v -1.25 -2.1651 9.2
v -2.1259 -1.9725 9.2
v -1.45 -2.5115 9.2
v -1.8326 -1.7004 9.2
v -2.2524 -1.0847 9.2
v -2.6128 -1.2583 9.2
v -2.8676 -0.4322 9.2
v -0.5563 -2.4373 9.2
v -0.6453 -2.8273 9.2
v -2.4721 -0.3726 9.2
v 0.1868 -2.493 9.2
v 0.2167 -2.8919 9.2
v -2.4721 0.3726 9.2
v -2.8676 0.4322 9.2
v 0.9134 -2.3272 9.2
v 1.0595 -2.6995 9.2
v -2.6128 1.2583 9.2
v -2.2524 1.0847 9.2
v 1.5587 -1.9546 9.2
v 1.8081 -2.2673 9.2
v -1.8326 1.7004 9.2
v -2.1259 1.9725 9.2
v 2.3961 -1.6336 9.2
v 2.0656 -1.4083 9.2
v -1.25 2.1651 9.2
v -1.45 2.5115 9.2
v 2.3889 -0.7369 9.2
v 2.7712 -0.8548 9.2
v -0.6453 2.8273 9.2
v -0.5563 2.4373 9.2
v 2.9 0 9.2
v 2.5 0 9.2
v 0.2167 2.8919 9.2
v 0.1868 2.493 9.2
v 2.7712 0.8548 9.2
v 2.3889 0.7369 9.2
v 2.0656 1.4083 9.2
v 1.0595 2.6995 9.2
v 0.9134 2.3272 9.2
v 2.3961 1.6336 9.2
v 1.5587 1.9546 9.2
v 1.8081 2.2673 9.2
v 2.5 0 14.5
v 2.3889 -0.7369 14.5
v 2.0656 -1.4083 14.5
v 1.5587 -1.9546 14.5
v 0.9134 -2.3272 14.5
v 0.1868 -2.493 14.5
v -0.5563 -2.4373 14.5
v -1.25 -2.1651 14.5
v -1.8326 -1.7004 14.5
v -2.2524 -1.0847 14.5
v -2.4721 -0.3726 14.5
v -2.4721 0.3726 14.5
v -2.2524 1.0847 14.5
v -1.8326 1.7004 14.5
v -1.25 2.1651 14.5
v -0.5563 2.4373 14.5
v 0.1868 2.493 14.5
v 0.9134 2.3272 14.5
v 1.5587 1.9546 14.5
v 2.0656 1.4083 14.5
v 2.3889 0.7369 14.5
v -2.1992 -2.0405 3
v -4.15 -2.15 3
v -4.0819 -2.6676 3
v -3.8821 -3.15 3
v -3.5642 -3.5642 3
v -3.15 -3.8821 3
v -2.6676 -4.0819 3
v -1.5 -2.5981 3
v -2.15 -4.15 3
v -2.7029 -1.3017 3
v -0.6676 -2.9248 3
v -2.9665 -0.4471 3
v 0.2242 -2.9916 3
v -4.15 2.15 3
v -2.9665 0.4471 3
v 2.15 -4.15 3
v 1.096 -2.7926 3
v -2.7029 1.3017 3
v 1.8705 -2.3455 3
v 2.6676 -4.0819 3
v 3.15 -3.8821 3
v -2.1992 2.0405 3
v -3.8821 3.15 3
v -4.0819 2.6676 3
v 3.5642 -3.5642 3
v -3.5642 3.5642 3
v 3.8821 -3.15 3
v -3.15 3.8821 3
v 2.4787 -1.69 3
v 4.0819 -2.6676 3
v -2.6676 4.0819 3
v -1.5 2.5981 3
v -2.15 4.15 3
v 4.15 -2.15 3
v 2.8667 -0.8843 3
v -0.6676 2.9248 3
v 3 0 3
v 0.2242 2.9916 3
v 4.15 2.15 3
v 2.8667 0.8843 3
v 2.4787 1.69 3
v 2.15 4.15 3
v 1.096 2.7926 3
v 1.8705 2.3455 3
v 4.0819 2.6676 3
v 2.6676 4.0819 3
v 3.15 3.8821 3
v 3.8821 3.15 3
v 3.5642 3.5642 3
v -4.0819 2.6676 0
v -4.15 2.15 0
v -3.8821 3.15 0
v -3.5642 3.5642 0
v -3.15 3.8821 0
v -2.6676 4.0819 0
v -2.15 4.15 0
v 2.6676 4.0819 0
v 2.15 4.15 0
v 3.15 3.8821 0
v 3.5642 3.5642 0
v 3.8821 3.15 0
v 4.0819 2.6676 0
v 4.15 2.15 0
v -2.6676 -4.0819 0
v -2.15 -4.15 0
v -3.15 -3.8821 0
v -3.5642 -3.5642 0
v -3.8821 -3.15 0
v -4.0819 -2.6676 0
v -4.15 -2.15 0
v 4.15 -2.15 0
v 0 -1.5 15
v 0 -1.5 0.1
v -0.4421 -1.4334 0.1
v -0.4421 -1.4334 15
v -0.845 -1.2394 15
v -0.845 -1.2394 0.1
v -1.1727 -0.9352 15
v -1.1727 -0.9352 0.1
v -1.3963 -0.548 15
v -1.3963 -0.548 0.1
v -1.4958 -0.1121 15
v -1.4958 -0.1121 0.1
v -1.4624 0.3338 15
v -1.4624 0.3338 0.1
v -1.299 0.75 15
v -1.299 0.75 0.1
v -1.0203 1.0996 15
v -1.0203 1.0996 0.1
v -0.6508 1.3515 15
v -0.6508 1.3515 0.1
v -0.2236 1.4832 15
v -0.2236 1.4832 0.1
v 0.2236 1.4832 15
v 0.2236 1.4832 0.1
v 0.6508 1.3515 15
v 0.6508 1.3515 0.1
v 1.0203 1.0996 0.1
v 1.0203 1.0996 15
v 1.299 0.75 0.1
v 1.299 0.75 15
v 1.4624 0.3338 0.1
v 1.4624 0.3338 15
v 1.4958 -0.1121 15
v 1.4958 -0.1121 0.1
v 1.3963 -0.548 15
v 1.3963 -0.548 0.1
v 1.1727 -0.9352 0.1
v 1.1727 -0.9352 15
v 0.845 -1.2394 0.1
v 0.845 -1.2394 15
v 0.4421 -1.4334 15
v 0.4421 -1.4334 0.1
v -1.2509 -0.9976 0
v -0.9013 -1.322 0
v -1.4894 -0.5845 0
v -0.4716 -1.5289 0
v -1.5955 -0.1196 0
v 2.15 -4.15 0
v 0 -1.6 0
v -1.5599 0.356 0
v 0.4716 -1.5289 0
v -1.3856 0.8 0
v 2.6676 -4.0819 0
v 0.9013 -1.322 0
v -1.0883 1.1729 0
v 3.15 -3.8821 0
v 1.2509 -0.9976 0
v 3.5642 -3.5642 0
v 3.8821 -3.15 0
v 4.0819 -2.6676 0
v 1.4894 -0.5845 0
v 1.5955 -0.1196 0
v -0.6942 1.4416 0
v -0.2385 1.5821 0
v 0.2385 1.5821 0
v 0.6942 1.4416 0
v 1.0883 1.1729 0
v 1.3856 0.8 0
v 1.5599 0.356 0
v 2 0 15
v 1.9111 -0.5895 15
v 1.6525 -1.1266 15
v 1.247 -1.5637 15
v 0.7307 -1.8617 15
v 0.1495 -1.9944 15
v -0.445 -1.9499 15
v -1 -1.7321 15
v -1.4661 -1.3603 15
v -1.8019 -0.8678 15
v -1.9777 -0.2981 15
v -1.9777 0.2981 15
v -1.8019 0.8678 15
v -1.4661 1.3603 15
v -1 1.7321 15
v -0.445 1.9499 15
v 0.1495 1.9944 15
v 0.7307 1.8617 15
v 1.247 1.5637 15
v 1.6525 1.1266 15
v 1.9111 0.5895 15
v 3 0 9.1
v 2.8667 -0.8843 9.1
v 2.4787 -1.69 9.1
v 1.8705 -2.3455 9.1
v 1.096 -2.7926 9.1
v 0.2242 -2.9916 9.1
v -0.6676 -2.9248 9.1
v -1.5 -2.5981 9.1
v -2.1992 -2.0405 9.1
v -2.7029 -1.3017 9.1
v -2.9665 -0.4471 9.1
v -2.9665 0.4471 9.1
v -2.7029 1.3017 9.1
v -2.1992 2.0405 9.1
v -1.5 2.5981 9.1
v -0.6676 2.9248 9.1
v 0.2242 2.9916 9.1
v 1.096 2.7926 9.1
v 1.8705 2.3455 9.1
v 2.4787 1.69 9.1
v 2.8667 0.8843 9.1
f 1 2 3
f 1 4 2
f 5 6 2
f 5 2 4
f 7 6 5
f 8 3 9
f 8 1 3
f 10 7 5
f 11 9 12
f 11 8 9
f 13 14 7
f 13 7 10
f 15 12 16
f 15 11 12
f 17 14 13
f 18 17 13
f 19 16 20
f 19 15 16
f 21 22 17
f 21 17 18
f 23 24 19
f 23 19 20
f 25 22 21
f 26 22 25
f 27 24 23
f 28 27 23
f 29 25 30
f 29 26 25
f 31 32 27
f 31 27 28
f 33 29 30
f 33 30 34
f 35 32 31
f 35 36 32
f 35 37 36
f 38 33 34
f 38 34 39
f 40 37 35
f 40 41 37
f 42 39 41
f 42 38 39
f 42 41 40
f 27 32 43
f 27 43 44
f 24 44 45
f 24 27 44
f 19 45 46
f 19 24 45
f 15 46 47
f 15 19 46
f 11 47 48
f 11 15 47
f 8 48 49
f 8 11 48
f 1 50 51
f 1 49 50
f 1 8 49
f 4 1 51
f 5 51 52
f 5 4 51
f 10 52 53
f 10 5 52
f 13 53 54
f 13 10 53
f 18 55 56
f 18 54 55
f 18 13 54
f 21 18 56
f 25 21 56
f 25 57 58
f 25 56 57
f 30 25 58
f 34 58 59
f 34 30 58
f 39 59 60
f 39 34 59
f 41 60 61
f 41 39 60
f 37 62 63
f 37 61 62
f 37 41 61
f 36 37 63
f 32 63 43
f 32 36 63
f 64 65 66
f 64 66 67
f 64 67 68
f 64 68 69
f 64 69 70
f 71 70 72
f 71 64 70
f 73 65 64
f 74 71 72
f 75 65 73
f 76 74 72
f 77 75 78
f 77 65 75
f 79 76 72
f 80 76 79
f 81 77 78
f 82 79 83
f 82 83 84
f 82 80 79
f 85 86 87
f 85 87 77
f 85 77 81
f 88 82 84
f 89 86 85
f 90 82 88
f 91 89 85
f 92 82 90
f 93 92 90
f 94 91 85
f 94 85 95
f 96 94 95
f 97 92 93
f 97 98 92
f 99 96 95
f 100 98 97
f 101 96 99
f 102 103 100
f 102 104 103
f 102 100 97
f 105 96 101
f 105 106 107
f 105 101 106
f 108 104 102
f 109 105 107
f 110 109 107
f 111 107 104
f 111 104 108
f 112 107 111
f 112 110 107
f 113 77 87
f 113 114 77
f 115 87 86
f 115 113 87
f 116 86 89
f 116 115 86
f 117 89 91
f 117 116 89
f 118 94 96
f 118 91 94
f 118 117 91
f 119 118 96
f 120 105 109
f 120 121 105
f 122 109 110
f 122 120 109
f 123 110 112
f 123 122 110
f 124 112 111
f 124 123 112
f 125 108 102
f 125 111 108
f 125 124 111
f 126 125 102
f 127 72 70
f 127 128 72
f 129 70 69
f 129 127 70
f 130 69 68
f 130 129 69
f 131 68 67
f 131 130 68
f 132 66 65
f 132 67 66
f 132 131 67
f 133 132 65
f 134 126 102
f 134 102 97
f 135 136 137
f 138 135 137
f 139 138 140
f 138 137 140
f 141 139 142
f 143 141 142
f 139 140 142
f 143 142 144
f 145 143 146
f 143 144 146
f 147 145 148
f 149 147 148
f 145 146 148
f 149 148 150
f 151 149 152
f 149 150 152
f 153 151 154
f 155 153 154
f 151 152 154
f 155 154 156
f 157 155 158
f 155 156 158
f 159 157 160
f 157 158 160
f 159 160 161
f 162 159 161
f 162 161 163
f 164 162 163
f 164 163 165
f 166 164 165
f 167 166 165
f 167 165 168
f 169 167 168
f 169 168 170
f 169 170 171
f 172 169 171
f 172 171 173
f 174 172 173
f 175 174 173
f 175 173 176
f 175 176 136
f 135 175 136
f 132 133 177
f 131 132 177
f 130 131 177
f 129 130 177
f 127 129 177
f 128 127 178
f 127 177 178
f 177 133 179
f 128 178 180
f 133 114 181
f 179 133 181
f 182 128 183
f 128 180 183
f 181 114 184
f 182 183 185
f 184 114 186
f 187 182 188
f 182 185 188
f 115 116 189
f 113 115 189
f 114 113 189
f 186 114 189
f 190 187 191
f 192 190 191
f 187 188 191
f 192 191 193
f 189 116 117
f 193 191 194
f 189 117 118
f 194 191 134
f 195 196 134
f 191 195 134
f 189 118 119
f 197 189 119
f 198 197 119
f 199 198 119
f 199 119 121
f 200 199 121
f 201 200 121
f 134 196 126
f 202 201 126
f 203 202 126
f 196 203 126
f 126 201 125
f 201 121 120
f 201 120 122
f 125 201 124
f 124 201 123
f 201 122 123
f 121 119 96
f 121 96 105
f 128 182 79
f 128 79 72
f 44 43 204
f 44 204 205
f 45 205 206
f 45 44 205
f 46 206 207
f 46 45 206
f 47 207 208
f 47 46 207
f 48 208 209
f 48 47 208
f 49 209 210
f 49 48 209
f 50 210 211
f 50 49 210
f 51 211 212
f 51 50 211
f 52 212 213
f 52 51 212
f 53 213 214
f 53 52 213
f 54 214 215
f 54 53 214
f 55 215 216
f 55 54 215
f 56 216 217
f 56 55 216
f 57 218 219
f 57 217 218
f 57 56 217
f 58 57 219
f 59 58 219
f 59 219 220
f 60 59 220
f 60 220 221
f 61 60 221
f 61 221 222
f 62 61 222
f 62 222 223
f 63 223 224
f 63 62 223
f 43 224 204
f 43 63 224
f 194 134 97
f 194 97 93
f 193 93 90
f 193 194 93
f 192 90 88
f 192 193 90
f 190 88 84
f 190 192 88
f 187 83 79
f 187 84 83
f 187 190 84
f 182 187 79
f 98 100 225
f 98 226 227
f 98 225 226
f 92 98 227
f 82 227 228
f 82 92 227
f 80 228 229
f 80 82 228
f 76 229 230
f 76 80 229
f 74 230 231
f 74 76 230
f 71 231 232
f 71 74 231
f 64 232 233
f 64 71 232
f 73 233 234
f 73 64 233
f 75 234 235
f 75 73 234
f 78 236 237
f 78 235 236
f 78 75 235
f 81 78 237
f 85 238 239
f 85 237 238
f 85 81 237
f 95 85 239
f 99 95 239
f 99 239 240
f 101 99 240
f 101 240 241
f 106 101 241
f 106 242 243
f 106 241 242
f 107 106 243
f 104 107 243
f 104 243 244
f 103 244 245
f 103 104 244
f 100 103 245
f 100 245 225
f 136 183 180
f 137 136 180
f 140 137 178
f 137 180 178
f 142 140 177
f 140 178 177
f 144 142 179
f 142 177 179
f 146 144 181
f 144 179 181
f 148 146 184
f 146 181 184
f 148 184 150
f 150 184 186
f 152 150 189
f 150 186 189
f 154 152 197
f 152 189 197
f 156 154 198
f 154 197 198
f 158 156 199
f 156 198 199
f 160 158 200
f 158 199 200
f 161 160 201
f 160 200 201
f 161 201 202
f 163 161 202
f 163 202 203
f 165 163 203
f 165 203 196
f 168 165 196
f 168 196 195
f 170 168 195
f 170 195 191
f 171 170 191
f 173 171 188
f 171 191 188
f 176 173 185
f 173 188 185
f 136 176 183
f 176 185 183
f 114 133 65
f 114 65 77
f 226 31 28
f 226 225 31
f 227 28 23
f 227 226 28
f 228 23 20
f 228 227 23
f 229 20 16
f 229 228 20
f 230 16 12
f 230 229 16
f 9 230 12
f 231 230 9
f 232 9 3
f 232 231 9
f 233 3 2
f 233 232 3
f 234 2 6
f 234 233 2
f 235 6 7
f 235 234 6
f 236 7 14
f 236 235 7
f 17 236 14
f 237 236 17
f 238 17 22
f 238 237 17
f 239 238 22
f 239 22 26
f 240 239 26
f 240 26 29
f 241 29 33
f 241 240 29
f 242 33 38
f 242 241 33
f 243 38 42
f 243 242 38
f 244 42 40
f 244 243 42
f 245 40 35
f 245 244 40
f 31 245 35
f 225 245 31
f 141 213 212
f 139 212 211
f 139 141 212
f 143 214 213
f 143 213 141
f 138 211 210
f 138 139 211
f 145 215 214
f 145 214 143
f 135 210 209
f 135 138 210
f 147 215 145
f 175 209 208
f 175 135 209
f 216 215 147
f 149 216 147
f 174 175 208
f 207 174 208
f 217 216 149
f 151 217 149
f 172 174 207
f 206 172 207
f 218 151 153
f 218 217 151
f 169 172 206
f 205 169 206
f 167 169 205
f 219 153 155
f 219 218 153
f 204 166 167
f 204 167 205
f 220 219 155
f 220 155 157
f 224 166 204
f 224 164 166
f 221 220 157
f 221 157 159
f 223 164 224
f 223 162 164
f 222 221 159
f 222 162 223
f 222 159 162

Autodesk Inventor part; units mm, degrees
ref_plane "YZ Plane" through (0, 0, 0) normal (1, 0, 0) x (0, 1, 0)
ref_plane "XZ Plane" through (0, 0, 0) normal (0, 1, 0) x (-1, 0, 0)
ref_plane "XY Plane" through (0, 0, 0) normal (0, 0, 1) x (1, 0, 0)
sketch "Skizze1" plane through (0, 0, 0) normal (0, 0, 1) x (1, 0, 0)
  line L0 (-2.15, 4.15) -> (2.15, 4.15)
  line L1 (4.15, 2.15) -> (4.15, -2.15)
  line L2 (2.15, -4.15) -> (-2.15, -4.15)
  line L3 (-4.15, -2.15) -> (-4.15, 2.15)
  arc A0 (-2.15, 4.15) -> (-4.15, 2.15) centre (-2.15, 2.15) ccw
  arc A1 (4.15, 2.15) -> (2.15, 4.15) centre (2.15, 2.15) ccw
  arc A2 (2.15, -4.15) -> (4.15, -2.15) centre (2.15, -2.15) ccw
  arc A3 (-4.15, -2.15) -> (-2.15, -4.15) centre (-2.15, -2.15) ccw
  line L4 (-2.15, 2.15) -> (2.15, -2.15) construction
  line L5 (2.15, 2.15) -> (-2.15, -2.15) construction
  point P0 (0, 0)
  dimension "d0" = 2
  dimension "d1" = 8.3
extrude "Extrusion1" add sketch "Skizze1" along normal blind 3
sketch "Skizze2" plane through (0, 0, 3) normal (0, 0, 1) x (1, 0, 0)
  circle A0 centre (0, 0) radius 2.5
  circle A1 centre (0, 0) radius 3
  dimension "d4" = 5
  dimension "d22" = 6
extrude "Extrusion2" add sketch "Skizze2" along normal blind 12 contours A0
sketch "Skizze3" plane through (0, 0, 15) normal (0, 0, 1) x (1, 0, 0)
  point P0 (0, 0)
  point P1 (0, 0)
hole "Bohrung1" at (0, 0, 15) direction (0, 0, -1) diameter 3 end through all
chamfer "Fase1" distance 0.5 angle 45 1 edges at (-2.5, 0, 15)
thread "Gewinde2" size "M5x0.8" class "6g" standard "ISO Metric profile" length 4.5
extrude "Extrusion3" add sketch "Skizze2" along normal blind 6.2
sketch "Skizze4" plane through (0, 0, 0) normal (0, 0, -1) x (-1, 0, 0)
  point P0 (0, 0)
  point P1 (0, 0)
hole "Bohrung2" [suppressed]
chamfer "Fasen2" distance 0.1 angle 45 2 edges at (-3, 0, 9.2) (0, 1.5, 0)
chamfer "Fasen3" [suppressed]
properties part number "Radadapter" material "Aluminium 6061"
